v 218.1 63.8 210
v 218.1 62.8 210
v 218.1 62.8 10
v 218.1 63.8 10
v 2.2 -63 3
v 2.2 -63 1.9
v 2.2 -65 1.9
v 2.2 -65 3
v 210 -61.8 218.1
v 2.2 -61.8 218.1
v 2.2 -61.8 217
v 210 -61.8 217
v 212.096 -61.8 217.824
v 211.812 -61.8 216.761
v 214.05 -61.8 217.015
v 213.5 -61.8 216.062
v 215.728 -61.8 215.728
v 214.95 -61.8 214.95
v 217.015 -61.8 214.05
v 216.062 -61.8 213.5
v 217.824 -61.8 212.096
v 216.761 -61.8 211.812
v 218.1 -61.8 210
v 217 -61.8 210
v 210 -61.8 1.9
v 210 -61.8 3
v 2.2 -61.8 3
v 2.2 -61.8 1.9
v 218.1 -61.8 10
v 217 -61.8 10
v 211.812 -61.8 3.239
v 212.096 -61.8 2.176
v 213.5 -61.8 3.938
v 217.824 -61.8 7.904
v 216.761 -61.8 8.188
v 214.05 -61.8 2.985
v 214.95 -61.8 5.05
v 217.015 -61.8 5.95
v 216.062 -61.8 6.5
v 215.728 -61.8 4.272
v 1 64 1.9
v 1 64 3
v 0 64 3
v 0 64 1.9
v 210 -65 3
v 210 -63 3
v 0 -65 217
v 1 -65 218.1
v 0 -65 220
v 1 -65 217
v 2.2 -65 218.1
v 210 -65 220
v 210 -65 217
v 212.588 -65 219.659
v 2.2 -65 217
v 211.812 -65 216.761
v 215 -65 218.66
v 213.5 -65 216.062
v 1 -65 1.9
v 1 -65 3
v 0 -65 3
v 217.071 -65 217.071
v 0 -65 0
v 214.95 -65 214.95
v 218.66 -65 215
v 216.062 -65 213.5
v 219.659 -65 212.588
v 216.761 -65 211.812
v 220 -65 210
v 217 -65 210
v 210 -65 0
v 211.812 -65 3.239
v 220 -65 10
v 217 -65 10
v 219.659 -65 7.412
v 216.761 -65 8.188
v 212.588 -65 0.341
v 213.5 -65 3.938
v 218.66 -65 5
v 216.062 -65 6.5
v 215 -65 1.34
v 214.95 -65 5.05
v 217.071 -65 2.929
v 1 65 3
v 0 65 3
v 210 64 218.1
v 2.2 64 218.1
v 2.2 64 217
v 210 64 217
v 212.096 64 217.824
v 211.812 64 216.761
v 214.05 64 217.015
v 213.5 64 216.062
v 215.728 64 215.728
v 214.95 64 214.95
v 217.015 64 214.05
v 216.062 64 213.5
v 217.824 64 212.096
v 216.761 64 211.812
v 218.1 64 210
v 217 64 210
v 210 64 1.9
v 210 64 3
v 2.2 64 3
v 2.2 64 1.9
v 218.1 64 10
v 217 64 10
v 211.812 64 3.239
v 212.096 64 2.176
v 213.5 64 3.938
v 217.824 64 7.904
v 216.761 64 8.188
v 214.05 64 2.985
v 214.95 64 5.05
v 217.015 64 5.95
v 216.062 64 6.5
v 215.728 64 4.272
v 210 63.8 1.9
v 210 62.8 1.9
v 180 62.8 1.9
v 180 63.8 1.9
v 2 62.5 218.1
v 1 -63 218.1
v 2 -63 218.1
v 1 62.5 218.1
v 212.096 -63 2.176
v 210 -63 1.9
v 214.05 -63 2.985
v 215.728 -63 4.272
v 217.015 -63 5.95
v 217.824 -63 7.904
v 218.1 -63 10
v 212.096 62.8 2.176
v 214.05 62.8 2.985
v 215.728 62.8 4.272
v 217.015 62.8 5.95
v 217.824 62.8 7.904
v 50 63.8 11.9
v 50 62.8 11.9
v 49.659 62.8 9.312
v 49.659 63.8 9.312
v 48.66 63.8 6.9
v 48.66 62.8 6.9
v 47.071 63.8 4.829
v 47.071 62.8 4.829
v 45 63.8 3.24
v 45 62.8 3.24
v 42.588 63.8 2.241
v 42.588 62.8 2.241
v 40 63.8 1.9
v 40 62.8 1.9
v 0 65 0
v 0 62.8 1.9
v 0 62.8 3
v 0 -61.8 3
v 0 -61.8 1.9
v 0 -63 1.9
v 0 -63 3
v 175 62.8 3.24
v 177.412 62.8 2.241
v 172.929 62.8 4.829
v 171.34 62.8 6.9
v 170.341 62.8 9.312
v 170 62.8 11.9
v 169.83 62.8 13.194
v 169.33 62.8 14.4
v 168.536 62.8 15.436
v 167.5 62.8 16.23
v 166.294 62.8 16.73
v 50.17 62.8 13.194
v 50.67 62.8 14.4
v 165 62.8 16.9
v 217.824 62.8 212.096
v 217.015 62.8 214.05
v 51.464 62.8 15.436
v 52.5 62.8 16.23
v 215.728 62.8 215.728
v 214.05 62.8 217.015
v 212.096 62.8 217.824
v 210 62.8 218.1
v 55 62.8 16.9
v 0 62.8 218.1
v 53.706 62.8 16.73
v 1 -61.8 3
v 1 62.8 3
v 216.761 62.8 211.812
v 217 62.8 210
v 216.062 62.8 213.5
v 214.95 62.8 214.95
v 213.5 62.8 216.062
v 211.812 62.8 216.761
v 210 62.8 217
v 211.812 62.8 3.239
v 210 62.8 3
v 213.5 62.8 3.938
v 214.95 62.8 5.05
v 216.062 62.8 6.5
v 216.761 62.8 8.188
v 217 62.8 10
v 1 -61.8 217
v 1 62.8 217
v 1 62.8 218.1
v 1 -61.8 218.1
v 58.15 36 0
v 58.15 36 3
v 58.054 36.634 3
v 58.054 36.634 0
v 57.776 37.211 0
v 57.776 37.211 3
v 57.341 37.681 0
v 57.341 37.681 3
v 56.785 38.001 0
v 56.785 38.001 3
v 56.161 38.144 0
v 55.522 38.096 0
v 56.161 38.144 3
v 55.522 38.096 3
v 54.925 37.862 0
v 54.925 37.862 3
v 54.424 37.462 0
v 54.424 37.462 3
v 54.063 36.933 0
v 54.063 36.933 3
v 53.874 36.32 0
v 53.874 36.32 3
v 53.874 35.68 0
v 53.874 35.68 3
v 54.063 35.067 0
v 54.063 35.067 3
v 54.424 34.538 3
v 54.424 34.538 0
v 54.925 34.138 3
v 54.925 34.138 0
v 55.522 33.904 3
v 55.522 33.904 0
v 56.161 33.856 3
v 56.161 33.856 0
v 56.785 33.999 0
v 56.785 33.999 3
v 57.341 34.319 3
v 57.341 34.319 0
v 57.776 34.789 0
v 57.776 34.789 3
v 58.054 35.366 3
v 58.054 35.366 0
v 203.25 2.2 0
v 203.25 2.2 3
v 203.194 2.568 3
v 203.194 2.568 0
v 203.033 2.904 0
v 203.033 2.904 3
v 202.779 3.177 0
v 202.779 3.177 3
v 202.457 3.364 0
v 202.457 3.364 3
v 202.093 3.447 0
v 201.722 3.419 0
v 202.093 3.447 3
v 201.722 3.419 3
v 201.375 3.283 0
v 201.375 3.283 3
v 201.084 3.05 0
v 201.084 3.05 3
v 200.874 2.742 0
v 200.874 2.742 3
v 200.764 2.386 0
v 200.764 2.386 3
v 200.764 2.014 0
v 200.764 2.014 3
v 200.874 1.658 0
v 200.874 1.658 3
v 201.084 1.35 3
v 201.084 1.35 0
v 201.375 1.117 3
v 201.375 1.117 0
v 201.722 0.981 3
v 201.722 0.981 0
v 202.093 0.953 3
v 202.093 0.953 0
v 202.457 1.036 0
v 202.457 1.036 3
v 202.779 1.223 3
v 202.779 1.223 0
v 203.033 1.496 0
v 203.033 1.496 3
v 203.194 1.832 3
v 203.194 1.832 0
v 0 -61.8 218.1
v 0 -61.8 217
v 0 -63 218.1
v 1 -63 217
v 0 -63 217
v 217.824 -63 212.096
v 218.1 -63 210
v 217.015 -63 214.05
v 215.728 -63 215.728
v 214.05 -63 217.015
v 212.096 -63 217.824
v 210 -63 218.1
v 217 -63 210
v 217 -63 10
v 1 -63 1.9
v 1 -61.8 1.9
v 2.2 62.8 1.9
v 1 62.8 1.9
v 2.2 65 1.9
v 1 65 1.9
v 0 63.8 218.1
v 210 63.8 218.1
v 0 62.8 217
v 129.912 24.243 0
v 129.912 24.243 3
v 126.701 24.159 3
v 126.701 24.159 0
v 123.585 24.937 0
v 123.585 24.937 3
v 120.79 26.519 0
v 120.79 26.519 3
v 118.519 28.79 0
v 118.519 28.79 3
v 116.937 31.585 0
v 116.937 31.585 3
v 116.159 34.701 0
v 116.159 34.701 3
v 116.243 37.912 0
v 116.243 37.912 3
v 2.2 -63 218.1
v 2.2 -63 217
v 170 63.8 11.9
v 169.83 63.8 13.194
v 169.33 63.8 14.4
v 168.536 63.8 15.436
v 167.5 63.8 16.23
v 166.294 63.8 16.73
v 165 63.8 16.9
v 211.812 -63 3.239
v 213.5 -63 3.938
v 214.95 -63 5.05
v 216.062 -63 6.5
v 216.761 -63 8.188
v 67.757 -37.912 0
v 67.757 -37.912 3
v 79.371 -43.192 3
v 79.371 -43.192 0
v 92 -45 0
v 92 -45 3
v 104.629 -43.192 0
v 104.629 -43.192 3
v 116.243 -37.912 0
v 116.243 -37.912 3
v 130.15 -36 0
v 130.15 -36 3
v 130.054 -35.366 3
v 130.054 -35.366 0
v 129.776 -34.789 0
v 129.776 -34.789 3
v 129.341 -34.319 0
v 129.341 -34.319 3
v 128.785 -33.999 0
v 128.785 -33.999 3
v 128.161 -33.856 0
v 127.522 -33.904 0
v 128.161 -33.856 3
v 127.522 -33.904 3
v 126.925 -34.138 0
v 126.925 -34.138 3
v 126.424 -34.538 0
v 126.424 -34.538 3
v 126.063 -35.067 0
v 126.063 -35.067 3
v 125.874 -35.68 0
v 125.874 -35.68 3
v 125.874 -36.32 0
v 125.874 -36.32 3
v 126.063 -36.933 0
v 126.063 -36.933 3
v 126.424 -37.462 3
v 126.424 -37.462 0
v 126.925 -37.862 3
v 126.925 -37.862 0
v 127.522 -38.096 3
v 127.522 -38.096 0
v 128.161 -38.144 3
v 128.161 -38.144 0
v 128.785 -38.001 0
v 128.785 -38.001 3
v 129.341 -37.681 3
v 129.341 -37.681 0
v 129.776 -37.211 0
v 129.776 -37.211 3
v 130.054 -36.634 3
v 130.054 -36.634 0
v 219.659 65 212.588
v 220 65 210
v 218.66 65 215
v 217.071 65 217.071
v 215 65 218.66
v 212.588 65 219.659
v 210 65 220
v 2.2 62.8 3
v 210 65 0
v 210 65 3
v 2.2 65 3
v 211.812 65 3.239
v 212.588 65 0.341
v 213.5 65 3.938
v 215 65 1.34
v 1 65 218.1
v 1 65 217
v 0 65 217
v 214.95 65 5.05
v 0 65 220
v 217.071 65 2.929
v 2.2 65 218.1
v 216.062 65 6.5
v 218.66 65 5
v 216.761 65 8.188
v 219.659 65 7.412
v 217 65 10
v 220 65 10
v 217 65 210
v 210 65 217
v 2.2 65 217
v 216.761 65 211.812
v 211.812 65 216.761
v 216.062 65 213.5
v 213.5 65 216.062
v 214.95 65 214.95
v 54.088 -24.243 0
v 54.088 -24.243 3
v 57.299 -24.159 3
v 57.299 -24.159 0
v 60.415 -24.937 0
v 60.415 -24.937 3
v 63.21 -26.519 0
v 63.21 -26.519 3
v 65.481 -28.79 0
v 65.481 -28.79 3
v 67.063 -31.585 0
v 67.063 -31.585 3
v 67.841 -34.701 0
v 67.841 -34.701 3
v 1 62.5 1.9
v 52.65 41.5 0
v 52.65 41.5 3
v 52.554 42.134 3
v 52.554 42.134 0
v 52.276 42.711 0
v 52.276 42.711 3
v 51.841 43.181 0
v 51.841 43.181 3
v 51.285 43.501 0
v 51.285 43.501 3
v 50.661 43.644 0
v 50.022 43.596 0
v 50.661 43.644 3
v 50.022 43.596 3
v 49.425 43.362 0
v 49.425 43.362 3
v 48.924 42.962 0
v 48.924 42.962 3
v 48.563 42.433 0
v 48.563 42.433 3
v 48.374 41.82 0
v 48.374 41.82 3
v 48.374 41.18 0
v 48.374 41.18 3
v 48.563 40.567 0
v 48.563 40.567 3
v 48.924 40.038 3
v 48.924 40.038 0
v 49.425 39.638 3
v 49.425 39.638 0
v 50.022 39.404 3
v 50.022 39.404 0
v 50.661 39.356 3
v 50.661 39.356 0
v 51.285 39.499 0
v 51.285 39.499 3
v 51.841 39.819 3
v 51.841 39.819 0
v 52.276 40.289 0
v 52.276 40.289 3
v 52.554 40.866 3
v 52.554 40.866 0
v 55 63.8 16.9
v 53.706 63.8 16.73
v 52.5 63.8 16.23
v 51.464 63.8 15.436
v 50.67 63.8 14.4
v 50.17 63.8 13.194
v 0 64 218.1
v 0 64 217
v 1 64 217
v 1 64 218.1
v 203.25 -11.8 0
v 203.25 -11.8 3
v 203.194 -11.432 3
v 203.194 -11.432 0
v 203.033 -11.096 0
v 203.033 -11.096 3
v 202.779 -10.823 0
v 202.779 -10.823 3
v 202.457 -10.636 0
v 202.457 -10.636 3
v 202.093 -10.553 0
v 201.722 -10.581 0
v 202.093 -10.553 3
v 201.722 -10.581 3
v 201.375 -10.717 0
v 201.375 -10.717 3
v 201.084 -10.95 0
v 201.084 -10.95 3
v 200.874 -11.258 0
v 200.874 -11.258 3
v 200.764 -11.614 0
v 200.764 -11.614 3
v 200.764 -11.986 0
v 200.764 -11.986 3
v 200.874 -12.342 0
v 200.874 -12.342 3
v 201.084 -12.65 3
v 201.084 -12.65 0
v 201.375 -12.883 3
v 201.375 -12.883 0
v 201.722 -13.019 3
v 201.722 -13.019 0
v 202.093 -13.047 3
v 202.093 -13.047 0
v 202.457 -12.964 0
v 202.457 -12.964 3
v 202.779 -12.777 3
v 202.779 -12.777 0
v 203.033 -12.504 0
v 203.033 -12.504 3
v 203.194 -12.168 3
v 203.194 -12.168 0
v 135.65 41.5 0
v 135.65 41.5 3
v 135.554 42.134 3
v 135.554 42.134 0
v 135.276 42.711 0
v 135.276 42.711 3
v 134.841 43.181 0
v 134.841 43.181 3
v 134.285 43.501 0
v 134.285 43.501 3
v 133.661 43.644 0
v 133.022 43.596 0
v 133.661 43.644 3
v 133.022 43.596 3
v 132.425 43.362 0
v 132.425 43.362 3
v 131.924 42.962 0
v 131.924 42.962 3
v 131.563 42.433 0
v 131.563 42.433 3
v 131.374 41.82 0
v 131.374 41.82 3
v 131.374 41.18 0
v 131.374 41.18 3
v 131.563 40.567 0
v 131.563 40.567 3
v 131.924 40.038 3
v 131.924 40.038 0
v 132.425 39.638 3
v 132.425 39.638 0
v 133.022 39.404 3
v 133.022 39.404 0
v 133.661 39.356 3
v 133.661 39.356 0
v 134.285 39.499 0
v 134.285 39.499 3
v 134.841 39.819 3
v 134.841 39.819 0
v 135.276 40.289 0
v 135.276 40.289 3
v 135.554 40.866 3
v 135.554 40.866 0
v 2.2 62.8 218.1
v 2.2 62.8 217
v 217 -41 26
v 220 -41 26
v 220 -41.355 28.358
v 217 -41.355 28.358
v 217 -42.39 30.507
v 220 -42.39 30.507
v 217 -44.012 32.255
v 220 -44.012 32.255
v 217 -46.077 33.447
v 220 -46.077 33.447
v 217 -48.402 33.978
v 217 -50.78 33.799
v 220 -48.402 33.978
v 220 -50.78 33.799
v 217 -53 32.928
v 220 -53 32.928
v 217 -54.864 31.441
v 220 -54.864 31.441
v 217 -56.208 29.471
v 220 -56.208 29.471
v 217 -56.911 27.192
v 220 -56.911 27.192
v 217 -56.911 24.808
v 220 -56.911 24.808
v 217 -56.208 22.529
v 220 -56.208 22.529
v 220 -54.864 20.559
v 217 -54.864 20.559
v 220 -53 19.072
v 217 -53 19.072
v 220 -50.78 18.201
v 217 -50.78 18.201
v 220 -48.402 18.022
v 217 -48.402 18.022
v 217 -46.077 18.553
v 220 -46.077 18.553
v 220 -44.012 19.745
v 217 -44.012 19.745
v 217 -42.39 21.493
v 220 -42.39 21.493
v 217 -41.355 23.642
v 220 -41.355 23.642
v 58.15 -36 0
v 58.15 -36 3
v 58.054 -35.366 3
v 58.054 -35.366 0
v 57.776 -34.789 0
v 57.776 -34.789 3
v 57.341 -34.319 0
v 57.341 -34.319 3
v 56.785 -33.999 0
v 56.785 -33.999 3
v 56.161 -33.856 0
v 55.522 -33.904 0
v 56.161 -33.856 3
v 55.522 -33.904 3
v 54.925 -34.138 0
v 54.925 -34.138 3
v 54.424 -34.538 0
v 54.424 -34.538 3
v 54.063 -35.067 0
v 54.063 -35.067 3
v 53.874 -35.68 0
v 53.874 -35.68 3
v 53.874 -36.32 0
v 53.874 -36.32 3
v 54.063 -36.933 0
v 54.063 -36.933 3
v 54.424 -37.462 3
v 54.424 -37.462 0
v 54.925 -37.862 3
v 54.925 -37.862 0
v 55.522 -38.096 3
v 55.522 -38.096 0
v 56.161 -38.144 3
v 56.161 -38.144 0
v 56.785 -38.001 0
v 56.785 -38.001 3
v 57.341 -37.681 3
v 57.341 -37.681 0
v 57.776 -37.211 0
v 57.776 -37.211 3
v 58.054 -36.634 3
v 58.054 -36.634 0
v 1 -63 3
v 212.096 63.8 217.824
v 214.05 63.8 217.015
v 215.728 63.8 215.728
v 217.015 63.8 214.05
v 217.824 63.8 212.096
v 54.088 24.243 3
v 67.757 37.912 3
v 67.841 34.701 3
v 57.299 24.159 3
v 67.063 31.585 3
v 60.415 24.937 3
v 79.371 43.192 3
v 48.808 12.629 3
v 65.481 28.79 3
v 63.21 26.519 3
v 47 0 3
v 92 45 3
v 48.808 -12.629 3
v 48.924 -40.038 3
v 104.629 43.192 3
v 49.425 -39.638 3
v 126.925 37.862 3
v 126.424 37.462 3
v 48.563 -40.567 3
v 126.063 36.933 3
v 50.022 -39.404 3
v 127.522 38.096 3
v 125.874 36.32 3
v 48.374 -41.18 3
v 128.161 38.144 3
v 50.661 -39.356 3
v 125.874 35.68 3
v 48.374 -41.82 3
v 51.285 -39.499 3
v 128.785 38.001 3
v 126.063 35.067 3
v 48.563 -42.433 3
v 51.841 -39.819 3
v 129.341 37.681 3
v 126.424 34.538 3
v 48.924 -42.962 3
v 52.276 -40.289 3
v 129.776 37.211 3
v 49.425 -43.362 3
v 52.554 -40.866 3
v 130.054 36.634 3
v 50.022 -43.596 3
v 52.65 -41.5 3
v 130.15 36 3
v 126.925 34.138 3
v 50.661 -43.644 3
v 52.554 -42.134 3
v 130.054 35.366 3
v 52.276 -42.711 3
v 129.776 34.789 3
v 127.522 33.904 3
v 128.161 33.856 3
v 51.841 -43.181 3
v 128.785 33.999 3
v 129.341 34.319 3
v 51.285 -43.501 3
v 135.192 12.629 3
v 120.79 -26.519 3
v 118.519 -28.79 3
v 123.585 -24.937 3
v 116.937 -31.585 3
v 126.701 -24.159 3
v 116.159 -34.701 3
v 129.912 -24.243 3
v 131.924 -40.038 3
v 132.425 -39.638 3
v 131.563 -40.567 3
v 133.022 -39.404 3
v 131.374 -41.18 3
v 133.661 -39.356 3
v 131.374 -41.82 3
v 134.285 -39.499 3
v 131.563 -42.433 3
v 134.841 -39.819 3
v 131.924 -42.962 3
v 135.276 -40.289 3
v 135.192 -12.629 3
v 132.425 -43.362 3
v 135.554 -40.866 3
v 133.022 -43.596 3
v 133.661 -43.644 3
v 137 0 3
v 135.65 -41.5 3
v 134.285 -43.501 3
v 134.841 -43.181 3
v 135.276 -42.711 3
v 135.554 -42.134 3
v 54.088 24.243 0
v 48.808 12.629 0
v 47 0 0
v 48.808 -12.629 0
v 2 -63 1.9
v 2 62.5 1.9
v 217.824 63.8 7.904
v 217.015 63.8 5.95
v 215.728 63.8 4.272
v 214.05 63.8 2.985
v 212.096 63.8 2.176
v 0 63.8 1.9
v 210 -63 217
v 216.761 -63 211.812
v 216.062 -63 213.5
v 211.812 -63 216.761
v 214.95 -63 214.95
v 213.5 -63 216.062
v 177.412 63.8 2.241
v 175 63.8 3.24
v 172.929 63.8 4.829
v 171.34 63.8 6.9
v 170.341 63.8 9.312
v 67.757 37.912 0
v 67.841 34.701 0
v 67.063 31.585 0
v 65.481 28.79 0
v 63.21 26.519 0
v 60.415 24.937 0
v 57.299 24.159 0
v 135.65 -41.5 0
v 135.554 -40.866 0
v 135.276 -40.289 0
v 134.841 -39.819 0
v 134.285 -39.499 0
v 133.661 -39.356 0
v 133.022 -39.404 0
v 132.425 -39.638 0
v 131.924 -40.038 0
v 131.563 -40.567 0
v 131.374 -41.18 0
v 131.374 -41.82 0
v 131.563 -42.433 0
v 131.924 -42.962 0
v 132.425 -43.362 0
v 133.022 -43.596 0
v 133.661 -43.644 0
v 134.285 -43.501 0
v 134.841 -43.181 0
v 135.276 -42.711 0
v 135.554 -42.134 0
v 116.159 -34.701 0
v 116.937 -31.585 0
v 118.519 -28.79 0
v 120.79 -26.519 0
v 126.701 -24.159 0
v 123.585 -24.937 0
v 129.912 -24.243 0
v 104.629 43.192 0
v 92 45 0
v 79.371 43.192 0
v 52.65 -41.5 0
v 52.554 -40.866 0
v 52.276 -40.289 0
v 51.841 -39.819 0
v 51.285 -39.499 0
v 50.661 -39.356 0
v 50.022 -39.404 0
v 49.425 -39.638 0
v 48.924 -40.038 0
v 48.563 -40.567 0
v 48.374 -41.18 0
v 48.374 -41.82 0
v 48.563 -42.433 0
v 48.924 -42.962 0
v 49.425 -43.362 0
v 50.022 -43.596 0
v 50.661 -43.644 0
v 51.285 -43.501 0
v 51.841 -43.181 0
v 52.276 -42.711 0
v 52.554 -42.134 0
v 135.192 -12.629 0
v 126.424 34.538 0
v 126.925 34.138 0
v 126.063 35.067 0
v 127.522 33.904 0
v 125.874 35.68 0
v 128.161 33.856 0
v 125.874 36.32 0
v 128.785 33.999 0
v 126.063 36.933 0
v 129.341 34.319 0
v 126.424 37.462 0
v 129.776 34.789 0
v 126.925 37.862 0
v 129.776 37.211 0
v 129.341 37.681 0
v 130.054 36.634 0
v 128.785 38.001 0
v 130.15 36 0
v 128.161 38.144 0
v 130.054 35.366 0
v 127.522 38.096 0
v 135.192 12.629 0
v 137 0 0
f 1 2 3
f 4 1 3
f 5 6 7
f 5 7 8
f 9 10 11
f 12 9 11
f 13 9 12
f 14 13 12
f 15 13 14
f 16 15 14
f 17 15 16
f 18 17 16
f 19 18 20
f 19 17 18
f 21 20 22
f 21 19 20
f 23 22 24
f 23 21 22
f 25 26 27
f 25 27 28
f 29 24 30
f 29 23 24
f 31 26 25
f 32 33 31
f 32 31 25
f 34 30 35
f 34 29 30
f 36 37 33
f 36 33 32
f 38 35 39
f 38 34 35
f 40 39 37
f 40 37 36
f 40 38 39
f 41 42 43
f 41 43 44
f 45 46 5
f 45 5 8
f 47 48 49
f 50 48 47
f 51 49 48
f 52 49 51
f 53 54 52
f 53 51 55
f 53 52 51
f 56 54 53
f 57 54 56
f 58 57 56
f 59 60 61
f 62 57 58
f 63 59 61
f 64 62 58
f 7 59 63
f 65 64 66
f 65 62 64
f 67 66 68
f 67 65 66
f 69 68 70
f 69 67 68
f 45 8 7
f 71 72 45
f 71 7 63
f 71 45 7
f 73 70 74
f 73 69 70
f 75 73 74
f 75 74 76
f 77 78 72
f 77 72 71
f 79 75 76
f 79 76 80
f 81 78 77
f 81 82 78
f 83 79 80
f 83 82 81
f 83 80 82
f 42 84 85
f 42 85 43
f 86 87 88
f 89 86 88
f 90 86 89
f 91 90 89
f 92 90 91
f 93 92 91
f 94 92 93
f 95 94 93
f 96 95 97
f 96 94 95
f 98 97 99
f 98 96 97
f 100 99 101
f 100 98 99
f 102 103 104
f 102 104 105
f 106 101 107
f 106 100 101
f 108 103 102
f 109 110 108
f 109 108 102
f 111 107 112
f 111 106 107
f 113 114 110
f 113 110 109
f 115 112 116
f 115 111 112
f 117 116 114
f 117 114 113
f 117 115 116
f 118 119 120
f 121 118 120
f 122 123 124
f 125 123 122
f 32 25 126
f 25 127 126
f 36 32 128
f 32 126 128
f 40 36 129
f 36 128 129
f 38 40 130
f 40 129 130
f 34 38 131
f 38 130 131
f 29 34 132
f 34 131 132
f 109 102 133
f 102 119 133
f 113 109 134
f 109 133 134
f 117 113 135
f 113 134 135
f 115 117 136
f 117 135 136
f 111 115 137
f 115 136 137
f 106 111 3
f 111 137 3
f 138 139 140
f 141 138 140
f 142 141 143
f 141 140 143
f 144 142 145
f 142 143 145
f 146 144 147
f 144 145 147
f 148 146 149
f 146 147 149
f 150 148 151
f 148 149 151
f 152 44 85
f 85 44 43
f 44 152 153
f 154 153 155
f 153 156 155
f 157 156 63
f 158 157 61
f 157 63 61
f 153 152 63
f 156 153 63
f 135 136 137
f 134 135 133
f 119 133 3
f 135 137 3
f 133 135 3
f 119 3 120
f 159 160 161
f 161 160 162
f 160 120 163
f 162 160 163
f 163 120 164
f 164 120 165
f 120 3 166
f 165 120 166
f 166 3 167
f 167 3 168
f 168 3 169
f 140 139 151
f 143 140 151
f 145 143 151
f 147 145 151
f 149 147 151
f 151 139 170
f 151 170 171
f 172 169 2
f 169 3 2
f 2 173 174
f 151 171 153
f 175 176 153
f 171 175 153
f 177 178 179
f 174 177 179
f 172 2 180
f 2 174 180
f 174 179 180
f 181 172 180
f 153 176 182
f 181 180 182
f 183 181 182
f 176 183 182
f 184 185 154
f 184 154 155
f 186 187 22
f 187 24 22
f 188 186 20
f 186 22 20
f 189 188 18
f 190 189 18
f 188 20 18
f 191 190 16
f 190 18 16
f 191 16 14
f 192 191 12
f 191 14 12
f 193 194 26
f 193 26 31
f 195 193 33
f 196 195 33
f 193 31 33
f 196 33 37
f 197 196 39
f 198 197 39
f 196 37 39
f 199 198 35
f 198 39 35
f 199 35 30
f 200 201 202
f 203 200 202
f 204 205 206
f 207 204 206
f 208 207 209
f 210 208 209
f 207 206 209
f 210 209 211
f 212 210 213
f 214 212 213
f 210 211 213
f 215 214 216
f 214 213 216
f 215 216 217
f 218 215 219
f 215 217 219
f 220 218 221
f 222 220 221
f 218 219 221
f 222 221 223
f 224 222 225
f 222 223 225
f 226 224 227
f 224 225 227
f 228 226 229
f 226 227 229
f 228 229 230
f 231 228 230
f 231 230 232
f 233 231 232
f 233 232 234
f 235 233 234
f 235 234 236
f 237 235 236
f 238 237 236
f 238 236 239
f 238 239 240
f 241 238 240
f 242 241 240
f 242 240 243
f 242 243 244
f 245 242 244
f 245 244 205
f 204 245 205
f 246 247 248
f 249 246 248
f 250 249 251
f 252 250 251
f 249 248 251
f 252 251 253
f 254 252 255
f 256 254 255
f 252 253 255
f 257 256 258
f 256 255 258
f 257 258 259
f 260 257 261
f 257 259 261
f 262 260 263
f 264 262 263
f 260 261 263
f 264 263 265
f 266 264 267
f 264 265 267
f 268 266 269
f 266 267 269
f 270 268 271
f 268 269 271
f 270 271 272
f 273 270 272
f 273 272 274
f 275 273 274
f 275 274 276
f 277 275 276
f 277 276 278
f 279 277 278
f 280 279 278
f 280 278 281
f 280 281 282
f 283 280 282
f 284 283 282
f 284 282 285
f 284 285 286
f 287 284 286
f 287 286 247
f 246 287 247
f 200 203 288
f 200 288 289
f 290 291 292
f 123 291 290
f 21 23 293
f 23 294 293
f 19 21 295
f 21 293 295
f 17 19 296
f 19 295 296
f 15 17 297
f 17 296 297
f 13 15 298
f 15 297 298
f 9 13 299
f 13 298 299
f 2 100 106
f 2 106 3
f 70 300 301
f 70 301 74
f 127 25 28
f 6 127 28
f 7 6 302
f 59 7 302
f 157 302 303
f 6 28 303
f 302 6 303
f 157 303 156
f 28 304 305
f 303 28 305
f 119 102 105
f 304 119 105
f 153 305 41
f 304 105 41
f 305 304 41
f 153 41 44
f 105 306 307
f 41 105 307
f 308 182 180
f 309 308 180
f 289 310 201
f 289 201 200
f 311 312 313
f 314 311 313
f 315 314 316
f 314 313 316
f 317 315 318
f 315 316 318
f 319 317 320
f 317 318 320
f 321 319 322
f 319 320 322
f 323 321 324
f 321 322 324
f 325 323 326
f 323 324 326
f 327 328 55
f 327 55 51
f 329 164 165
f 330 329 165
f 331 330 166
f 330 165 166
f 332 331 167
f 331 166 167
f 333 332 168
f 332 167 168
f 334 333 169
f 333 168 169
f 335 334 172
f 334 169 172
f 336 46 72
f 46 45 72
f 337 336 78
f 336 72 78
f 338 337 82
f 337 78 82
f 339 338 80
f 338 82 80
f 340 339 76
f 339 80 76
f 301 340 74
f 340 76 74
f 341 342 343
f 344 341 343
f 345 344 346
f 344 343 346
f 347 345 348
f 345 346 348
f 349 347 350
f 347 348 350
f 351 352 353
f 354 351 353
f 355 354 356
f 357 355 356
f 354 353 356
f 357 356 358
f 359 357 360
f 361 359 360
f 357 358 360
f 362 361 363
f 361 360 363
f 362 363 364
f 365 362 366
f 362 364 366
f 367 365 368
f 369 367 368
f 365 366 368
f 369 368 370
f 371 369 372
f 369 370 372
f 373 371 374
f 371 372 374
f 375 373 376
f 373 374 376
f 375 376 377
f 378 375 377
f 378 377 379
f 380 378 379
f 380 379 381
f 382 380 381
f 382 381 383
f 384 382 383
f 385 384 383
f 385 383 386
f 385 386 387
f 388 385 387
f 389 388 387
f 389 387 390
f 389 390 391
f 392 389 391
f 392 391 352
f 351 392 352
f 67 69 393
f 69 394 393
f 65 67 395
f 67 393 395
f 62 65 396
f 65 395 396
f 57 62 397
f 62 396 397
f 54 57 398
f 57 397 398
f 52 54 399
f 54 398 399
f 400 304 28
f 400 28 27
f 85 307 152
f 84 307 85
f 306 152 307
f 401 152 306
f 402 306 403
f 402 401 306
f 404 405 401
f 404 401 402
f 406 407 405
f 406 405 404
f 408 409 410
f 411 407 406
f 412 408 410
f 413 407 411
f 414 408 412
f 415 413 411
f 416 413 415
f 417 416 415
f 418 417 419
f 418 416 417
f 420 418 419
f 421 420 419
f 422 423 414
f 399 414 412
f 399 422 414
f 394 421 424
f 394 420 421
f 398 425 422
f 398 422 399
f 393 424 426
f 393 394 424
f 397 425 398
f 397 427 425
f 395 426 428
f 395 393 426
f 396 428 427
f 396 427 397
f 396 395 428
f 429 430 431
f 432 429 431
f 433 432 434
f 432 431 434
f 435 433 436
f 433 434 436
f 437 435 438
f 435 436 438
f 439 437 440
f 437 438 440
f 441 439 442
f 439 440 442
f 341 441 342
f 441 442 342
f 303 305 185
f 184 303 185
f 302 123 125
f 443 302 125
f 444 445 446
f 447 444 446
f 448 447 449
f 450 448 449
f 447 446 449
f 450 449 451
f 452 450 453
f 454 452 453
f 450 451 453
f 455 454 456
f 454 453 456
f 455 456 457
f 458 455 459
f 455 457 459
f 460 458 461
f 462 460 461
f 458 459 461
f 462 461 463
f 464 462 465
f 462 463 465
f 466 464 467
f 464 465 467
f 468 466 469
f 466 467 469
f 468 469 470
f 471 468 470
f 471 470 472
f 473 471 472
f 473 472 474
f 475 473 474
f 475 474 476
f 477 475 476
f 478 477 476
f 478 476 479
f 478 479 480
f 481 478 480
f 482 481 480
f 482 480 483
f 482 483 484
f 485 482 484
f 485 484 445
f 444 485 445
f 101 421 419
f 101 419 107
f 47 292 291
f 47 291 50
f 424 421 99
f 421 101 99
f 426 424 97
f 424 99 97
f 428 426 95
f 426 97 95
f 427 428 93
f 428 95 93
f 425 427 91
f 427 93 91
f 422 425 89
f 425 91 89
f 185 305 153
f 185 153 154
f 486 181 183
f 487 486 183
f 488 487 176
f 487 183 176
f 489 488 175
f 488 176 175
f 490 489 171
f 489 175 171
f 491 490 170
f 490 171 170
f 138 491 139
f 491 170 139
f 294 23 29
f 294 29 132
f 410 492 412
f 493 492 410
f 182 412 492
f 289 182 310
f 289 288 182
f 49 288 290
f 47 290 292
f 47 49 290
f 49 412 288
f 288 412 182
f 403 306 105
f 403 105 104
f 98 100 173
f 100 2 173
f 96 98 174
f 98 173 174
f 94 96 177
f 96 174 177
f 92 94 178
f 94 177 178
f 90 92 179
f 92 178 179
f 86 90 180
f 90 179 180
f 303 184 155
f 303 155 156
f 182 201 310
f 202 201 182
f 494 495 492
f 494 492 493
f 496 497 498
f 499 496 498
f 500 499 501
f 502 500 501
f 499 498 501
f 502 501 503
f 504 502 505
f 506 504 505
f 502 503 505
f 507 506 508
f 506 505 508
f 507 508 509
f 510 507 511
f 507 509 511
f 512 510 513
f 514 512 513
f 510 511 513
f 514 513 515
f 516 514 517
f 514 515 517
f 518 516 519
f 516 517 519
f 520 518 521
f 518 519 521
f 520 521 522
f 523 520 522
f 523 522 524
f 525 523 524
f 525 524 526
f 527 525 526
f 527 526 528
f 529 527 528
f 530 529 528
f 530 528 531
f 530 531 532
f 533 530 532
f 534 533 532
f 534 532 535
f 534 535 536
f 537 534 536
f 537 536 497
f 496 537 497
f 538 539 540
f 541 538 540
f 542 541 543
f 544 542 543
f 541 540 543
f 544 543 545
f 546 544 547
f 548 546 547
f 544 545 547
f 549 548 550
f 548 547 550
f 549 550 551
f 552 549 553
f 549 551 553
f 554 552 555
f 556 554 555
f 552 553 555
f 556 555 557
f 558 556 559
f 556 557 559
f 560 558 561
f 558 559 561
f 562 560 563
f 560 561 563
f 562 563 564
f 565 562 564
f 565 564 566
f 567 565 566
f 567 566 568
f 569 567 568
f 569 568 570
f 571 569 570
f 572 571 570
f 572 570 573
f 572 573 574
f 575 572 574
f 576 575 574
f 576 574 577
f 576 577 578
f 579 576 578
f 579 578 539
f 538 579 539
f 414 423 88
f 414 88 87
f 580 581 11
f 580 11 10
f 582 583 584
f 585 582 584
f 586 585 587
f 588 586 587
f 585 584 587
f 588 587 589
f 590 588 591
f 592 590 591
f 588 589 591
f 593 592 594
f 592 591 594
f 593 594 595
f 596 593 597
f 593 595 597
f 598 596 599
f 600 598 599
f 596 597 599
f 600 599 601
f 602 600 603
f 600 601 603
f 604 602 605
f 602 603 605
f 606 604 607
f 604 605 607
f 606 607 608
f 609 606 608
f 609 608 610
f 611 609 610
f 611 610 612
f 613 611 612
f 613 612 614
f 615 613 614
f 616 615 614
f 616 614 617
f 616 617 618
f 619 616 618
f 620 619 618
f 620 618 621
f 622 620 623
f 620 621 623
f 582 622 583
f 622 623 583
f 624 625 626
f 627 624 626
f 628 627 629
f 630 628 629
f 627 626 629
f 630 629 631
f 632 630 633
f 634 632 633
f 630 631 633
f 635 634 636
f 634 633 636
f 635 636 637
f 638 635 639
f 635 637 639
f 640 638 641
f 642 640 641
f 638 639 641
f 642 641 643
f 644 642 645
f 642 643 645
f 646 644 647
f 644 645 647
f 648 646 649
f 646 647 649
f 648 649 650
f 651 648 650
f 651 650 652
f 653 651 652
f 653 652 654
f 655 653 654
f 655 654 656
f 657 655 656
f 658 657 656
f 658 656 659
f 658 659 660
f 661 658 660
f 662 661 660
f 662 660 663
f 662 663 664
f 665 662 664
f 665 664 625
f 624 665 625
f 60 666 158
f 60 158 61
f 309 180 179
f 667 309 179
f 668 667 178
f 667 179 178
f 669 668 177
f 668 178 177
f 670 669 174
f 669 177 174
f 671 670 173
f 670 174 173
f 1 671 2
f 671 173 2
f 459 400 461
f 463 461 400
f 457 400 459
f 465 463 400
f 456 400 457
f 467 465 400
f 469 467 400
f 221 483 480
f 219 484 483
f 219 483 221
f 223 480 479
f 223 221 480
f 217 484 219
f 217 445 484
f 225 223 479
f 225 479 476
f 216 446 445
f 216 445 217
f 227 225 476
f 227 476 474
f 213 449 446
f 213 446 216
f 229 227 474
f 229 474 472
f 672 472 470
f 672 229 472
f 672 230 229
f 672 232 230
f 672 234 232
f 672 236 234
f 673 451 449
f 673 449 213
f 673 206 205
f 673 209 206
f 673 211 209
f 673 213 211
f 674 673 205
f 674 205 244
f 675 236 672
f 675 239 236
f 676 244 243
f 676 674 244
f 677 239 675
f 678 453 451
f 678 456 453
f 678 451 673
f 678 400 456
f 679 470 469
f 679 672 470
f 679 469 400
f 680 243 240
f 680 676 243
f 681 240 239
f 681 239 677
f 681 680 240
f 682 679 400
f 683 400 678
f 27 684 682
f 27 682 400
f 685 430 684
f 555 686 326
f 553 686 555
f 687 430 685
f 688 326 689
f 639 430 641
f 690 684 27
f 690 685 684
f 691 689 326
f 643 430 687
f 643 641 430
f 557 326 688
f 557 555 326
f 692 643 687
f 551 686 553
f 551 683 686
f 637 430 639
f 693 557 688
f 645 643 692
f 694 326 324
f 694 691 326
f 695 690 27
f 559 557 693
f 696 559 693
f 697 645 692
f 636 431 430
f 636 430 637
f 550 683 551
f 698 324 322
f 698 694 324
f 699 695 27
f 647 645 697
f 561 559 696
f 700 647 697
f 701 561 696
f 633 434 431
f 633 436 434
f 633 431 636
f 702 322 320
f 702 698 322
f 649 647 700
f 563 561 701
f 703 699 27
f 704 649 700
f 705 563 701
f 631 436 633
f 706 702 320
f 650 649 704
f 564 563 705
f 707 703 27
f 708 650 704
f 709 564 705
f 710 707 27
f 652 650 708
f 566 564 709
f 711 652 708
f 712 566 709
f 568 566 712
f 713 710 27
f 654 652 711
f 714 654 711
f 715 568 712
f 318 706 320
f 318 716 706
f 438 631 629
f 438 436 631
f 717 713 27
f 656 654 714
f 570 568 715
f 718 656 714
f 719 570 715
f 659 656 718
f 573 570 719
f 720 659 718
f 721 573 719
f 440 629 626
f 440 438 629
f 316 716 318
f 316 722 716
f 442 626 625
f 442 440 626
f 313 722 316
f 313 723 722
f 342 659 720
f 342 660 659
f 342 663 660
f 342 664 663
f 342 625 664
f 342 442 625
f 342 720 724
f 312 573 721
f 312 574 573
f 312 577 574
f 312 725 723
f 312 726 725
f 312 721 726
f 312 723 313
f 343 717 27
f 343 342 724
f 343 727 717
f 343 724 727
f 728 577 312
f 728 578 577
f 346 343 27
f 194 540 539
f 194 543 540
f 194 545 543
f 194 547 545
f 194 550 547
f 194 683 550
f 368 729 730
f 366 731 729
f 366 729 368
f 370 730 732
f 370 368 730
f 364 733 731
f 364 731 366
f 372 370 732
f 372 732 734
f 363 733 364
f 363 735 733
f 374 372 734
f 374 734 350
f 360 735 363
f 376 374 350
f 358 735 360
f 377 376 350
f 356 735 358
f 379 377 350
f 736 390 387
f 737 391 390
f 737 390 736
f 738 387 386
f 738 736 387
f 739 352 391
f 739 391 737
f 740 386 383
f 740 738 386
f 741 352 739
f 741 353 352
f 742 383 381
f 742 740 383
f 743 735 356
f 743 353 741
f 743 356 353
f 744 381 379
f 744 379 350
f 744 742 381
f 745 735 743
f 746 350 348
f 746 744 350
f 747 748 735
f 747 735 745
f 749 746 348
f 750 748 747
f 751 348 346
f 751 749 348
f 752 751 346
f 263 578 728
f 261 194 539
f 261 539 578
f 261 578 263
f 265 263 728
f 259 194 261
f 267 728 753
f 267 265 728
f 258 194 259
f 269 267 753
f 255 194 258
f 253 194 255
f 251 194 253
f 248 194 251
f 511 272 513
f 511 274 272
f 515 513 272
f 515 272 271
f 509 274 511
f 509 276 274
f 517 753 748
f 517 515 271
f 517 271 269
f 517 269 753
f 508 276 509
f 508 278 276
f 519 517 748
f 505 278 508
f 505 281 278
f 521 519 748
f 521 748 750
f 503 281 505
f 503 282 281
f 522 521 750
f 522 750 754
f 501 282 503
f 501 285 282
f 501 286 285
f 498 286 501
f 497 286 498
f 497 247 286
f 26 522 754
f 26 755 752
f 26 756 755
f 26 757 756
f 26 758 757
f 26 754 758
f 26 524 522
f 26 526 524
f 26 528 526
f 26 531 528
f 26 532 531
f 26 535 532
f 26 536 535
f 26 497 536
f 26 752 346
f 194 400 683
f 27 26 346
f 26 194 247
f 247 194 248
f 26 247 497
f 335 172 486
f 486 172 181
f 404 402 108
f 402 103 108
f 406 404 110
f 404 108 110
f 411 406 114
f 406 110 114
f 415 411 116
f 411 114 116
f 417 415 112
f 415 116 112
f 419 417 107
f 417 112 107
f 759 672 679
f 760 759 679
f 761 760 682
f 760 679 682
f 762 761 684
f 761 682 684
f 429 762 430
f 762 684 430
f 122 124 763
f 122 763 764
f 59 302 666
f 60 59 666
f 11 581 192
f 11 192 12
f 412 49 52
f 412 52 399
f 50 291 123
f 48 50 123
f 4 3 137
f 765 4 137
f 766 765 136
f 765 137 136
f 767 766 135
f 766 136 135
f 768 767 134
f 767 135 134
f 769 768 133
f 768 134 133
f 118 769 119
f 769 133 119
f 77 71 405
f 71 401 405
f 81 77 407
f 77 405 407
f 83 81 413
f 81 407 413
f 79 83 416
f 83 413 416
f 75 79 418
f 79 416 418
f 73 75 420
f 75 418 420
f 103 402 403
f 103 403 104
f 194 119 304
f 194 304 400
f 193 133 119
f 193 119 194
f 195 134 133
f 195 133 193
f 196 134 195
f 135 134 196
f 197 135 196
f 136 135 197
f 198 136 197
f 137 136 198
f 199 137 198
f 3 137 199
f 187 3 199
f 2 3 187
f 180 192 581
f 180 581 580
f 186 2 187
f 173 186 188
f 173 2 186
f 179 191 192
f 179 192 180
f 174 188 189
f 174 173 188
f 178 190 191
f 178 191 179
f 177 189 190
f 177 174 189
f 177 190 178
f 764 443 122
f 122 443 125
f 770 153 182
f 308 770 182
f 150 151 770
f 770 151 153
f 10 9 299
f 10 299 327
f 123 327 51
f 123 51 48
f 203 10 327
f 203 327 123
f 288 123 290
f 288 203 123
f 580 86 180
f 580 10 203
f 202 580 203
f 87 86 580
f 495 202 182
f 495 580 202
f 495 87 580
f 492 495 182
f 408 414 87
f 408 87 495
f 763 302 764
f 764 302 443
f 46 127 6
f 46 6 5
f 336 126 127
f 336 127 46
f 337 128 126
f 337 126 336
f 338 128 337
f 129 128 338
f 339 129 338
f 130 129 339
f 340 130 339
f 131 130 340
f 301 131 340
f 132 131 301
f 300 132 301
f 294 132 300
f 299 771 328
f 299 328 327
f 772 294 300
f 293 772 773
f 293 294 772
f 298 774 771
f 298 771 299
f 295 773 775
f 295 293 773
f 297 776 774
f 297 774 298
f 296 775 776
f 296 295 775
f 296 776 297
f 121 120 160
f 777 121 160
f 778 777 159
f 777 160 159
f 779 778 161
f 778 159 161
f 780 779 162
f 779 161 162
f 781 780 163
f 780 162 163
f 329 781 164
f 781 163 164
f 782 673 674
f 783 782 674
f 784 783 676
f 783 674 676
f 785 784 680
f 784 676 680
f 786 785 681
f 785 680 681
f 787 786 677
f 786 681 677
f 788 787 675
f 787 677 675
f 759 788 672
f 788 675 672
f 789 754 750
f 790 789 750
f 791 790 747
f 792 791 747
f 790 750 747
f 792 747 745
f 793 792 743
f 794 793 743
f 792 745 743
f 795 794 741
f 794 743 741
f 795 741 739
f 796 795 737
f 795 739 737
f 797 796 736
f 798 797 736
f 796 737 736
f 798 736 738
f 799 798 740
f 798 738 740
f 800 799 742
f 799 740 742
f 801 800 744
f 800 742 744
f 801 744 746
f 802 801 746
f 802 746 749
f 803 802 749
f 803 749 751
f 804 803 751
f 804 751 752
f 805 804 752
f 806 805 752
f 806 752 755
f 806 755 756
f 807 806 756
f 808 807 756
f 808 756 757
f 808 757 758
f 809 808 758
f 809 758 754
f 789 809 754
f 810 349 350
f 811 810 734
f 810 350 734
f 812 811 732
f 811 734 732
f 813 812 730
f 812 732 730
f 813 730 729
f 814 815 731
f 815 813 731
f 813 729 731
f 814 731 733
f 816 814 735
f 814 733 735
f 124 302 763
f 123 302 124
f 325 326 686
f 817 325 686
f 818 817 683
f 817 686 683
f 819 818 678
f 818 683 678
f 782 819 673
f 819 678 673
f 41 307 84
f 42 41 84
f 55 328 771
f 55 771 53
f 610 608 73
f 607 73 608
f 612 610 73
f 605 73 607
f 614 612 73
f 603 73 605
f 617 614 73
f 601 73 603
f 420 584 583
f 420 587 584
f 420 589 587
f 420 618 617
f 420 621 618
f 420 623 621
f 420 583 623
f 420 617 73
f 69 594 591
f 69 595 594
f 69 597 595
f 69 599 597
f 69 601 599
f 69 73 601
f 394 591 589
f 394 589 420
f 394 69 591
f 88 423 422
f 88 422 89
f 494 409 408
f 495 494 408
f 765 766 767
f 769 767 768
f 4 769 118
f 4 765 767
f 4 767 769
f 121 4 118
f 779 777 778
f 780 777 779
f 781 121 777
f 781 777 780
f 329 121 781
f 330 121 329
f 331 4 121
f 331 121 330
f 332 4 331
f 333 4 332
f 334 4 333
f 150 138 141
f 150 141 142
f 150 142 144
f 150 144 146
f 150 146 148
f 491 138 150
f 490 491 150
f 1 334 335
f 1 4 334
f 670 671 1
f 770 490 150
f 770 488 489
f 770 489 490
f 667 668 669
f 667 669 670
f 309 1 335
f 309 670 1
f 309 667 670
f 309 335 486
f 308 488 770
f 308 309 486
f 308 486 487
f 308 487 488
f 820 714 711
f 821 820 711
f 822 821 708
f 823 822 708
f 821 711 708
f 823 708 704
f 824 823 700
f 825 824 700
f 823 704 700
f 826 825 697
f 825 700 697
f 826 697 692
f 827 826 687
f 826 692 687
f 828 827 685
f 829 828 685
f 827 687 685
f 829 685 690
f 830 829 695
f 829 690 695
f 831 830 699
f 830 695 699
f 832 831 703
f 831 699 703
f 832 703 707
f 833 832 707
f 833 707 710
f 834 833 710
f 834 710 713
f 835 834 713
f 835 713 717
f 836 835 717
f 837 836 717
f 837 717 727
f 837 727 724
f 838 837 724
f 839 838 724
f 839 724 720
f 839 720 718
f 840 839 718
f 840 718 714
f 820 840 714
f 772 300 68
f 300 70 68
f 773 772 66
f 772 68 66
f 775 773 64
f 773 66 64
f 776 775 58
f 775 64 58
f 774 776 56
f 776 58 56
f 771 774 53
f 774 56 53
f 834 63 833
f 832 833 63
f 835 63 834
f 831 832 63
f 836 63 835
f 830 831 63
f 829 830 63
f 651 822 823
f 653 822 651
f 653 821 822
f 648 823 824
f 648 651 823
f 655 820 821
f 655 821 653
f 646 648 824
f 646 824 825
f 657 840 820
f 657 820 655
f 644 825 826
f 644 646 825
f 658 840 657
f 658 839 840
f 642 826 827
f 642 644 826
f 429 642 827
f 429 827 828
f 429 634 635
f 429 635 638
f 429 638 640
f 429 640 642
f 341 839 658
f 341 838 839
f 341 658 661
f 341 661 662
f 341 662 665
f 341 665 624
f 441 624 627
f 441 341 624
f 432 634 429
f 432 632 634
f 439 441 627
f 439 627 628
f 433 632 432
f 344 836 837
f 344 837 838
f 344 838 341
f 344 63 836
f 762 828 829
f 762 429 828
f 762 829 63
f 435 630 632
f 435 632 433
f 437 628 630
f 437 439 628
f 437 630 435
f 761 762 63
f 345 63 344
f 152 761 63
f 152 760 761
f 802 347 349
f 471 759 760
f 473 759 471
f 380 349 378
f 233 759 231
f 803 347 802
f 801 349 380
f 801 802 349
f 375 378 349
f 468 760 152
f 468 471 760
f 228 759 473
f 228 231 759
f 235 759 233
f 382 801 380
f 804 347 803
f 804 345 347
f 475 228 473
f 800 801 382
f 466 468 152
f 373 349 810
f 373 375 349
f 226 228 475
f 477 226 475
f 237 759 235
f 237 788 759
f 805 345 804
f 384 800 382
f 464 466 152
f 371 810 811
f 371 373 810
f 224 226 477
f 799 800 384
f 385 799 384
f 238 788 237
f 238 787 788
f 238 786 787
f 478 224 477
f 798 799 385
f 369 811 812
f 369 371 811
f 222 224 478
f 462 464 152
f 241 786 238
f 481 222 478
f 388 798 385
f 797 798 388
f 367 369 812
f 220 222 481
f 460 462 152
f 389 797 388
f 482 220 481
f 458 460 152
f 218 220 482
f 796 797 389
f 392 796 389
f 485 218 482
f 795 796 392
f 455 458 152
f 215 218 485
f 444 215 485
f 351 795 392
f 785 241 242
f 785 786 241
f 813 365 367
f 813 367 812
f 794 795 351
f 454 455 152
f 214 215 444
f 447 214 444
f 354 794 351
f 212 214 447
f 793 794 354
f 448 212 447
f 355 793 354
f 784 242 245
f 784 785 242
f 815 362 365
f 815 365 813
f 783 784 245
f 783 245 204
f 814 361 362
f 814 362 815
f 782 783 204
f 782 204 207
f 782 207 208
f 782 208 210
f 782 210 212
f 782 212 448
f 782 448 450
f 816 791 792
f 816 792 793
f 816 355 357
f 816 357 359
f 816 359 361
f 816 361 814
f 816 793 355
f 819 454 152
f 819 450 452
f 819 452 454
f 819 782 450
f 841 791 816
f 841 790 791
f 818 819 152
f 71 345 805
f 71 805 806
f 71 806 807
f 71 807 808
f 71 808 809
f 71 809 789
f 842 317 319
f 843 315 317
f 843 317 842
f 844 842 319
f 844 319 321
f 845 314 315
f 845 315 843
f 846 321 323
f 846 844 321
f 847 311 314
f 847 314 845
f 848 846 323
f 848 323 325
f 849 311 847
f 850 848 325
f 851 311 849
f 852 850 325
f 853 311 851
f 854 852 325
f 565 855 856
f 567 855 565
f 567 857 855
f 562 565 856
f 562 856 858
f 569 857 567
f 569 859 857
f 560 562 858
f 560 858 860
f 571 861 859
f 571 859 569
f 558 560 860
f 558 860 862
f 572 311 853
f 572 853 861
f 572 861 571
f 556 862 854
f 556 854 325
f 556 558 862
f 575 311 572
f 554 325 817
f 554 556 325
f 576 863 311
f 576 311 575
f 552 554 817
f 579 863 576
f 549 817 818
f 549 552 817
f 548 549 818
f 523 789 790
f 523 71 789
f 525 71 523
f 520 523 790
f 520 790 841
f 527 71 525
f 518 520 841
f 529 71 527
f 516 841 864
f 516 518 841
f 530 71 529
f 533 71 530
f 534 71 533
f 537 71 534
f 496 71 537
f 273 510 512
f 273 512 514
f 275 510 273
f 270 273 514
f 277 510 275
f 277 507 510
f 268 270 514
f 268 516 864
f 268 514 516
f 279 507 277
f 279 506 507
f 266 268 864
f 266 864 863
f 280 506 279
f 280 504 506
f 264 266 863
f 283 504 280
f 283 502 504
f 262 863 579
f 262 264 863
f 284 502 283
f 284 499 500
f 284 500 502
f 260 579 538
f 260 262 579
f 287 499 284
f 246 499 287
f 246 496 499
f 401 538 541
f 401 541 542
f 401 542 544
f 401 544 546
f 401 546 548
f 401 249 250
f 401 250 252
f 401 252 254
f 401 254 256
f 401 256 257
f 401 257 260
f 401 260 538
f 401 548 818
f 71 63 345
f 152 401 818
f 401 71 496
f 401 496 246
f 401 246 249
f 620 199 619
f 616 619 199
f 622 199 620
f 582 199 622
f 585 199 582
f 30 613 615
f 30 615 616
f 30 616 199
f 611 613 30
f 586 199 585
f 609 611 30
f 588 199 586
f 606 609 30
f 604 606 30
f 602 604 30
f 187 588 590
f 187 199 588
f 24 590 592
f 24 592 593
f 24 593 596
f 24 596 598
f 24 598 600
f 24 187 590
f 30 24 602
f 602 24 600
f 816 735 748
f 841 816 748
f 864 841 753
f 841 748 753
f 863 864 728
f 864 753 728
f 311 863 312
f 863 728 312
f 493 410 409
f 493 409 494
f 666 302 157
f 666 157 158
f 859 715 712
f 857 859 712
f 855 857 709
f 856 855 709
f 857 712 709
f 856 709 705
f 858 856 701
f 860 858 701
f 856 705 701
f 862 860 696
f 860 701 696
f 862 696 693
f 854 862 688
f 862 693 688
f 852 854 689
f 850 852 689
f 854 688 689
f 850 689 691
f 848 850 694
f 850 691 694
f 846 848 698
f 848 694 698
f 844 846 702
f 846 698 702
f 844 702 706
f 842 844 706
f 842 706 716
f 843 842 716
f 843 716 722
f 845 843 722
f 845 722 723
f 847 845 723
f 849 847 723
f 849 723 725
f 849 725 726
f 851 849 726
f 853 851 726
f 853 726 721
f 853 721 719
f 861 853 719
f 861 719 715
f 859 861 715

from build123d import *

# Parameters (mm, degrees)
F3_R      = 2.15
F4_DEPTH  = 25
F5_W      = 1.2
F5_H      = 1.1
F6_DEPTH  = 130.001
F8_D      = 2.5
F8_DEPTH  = 3.001
F9_R      = 8
F10_DEPTH = 3
F11_W     = 125.5
F11_H     = 216.2
F12_DEPTH = 1
F14_DEPTH = 1


with BuildPart() as f2:
    # F2: sweep along a path in F1
    with BuildLine(Plane.XZ) as f2_path:
        Line((0, 0), (210, 0))
        ThreePointArc((210, 0), (217.0710678119, 2.9289321881), (220, 10))
        Line((220, 10), (220, 210))
        ThreePointArc((220, 210), (217.0710678119, 217.0710678119), (210, 220))
        Line((210, 220), (0, 220))
    # F0 (on Right) → F2 (sweep)
    with BuildSketch(Plane.YZ):
        Polygon((-65, 3), (-65, 0), (65, 0), (65, 3), (64, 3), (64, 1.9), (62.8, 1.9), (62.8, 3), (-61.8, 3), (-61.8, 1.9), (-63, 1.9), (-63, 3), align=None)
    sweep(path=f2_path.line)

    # F3 (on face) → F4 (cut)
    with BuildSketch(Plane.XY.offset(3)):
        with BuildLine():
            ThreePointArc((67.7572959174, 37.91162485), (64.4228355337, 27.5771644663), (54.08837515, 24.2427040826))
            ThreePointArc((54.08837515, 24.2427040826), (47, 0), (54.08837515, -24.2427040826))
            ThreePointArc((54.08837515, -24.2427040826), (64.4228355337, -27.5771644663), (67.7572959174, -37.91162485))
            ThreePointArc((67.7572959174, -37.91162485), (92, -45), (116.2427040826, -37.91162485))
            ThreePointArc((116.2427040826, -37.91162485), (119.5771644663, -27.5771644663), (129.91162485, -24.2427040826))
            ThreePointArc((129.91162485, -24.2427040826), (137, 0), (129.91162485, 24.2427040826))
            ThreePointArc((129.91162485, 24.2427040826), (119.5771644663, 27.5771644663), (116.2427040826, 37.91162485))
            ThreePointArc((116.2427040826, 37.91162485), (92, 45), (67.7572959174, 37.91162485))
        make_face()
        with Locations((56, 36)):
            Circle(F3_R)
        with Locations((50.5, 41.5)):
            Circle(F3_R)
        with Locations((56, -36)):
            Circle(F3_R)
        with Locations((50.5, -41.5)):
            Circle(F3_R)
        with Locations((128, 36)):
            Circle(F3_R)
        with Locations((133.5, 41.5)):
            Circle(F3_R)
        with Locations((133.5, -41.5)):
            Circle(F3_R)
        with Locations((128, -36)):
            Circle(F3_R)
    extrude(amount=-F4_DEPTH, mode=Mode.SUBTRACT)

    # F5 (on face) → F6 (cut, through all)
    with BuildSketch(Plane(origin=(0, 65, 0), x_dir=(-1, 0, 0), z_dir=(0, 1, 0))):
        with Locations((-1.6, 2.45)):
            Rectangle(F5_W, F5_H)
        with Locations((-1.6, 217.55)):
            Rectangle(F5_W, F5_H)
    extrude(amount=-F6_DEPTH, mode=Mode.SUBTRACT)

    # F8 (through all, one way)
    with BuildSketch(Plane.XY.offset(3)):
        with Locations((202, 2.2), (202, -11.8)):
            Circle(F8_D / 2)
    extrude(amount=-F8_DEPTH, mode=Mode.SUBTRACT)

    # F9 (on face) → F10 (cut, through all)
    with BuildSketch(Plane.YZ.offset(220)):
        with Locations((-49, 26)):
            Circle(F9_R)
    extrude(amount=-F10_DEPTH, mode=Mode.SUBTRACT)


with BuildPart() as f12:
    # F11 (on face) → F12 (new body)
    with BuildSketch(Plane.YZ.offset(1)):
        with Locations((-0.25, 110)):
            Rectangle(F11_W, F11_H)
    extrude(amount=F12_DEPTH)


with BuildPart() as f14:
    # F13 (on face) → F14 (new body)
    with BuildSketch(Plane(origin=(0, 62.8, 0), x_dir=(-1, 0, 0), z_dir=(0, 1, 0))):
        with BuildLine():
            Line((-40, 1.9), (0, 1.9))
            Line((0, 1.9), (0, 218.1))
            Line((0, 218.1), (-210, 218.1))
            ThreePointArc((-210, 218.1), (-215.7275649276, 215.7275649276), (-218.1, 210))
            Line((-218.1, 210), (-218.1, 10))
            ThreePointArc((-218.1, 10), (-215.7275649276, 4.2724350724), (-210, 1.9))
            Line((-210, 1.9), (-180, 1.9))
            ThreePointArc((-180, 1.9), (-172.9289321881, 4.8289321881), (-170, 11.9))
            ThreePointArc((-170, 11.9), (-168.5355339059, 15.4355339059), (-165, 16.9))
            Line((-165, 16.9), (-55, 16.9))
            ThreePointArc((-55, 16.9), (-51.4644660941, 15.4355339059), (-50, 11.9))
            ThreePointArc((-50, 11.9), (-47.0710678119, 4.8289321881), (-40, 1.9))
        make_face()
    extrude(amount=F14_DEPTH)


solid = Compound([f2.part, f12.part, f14.part])
